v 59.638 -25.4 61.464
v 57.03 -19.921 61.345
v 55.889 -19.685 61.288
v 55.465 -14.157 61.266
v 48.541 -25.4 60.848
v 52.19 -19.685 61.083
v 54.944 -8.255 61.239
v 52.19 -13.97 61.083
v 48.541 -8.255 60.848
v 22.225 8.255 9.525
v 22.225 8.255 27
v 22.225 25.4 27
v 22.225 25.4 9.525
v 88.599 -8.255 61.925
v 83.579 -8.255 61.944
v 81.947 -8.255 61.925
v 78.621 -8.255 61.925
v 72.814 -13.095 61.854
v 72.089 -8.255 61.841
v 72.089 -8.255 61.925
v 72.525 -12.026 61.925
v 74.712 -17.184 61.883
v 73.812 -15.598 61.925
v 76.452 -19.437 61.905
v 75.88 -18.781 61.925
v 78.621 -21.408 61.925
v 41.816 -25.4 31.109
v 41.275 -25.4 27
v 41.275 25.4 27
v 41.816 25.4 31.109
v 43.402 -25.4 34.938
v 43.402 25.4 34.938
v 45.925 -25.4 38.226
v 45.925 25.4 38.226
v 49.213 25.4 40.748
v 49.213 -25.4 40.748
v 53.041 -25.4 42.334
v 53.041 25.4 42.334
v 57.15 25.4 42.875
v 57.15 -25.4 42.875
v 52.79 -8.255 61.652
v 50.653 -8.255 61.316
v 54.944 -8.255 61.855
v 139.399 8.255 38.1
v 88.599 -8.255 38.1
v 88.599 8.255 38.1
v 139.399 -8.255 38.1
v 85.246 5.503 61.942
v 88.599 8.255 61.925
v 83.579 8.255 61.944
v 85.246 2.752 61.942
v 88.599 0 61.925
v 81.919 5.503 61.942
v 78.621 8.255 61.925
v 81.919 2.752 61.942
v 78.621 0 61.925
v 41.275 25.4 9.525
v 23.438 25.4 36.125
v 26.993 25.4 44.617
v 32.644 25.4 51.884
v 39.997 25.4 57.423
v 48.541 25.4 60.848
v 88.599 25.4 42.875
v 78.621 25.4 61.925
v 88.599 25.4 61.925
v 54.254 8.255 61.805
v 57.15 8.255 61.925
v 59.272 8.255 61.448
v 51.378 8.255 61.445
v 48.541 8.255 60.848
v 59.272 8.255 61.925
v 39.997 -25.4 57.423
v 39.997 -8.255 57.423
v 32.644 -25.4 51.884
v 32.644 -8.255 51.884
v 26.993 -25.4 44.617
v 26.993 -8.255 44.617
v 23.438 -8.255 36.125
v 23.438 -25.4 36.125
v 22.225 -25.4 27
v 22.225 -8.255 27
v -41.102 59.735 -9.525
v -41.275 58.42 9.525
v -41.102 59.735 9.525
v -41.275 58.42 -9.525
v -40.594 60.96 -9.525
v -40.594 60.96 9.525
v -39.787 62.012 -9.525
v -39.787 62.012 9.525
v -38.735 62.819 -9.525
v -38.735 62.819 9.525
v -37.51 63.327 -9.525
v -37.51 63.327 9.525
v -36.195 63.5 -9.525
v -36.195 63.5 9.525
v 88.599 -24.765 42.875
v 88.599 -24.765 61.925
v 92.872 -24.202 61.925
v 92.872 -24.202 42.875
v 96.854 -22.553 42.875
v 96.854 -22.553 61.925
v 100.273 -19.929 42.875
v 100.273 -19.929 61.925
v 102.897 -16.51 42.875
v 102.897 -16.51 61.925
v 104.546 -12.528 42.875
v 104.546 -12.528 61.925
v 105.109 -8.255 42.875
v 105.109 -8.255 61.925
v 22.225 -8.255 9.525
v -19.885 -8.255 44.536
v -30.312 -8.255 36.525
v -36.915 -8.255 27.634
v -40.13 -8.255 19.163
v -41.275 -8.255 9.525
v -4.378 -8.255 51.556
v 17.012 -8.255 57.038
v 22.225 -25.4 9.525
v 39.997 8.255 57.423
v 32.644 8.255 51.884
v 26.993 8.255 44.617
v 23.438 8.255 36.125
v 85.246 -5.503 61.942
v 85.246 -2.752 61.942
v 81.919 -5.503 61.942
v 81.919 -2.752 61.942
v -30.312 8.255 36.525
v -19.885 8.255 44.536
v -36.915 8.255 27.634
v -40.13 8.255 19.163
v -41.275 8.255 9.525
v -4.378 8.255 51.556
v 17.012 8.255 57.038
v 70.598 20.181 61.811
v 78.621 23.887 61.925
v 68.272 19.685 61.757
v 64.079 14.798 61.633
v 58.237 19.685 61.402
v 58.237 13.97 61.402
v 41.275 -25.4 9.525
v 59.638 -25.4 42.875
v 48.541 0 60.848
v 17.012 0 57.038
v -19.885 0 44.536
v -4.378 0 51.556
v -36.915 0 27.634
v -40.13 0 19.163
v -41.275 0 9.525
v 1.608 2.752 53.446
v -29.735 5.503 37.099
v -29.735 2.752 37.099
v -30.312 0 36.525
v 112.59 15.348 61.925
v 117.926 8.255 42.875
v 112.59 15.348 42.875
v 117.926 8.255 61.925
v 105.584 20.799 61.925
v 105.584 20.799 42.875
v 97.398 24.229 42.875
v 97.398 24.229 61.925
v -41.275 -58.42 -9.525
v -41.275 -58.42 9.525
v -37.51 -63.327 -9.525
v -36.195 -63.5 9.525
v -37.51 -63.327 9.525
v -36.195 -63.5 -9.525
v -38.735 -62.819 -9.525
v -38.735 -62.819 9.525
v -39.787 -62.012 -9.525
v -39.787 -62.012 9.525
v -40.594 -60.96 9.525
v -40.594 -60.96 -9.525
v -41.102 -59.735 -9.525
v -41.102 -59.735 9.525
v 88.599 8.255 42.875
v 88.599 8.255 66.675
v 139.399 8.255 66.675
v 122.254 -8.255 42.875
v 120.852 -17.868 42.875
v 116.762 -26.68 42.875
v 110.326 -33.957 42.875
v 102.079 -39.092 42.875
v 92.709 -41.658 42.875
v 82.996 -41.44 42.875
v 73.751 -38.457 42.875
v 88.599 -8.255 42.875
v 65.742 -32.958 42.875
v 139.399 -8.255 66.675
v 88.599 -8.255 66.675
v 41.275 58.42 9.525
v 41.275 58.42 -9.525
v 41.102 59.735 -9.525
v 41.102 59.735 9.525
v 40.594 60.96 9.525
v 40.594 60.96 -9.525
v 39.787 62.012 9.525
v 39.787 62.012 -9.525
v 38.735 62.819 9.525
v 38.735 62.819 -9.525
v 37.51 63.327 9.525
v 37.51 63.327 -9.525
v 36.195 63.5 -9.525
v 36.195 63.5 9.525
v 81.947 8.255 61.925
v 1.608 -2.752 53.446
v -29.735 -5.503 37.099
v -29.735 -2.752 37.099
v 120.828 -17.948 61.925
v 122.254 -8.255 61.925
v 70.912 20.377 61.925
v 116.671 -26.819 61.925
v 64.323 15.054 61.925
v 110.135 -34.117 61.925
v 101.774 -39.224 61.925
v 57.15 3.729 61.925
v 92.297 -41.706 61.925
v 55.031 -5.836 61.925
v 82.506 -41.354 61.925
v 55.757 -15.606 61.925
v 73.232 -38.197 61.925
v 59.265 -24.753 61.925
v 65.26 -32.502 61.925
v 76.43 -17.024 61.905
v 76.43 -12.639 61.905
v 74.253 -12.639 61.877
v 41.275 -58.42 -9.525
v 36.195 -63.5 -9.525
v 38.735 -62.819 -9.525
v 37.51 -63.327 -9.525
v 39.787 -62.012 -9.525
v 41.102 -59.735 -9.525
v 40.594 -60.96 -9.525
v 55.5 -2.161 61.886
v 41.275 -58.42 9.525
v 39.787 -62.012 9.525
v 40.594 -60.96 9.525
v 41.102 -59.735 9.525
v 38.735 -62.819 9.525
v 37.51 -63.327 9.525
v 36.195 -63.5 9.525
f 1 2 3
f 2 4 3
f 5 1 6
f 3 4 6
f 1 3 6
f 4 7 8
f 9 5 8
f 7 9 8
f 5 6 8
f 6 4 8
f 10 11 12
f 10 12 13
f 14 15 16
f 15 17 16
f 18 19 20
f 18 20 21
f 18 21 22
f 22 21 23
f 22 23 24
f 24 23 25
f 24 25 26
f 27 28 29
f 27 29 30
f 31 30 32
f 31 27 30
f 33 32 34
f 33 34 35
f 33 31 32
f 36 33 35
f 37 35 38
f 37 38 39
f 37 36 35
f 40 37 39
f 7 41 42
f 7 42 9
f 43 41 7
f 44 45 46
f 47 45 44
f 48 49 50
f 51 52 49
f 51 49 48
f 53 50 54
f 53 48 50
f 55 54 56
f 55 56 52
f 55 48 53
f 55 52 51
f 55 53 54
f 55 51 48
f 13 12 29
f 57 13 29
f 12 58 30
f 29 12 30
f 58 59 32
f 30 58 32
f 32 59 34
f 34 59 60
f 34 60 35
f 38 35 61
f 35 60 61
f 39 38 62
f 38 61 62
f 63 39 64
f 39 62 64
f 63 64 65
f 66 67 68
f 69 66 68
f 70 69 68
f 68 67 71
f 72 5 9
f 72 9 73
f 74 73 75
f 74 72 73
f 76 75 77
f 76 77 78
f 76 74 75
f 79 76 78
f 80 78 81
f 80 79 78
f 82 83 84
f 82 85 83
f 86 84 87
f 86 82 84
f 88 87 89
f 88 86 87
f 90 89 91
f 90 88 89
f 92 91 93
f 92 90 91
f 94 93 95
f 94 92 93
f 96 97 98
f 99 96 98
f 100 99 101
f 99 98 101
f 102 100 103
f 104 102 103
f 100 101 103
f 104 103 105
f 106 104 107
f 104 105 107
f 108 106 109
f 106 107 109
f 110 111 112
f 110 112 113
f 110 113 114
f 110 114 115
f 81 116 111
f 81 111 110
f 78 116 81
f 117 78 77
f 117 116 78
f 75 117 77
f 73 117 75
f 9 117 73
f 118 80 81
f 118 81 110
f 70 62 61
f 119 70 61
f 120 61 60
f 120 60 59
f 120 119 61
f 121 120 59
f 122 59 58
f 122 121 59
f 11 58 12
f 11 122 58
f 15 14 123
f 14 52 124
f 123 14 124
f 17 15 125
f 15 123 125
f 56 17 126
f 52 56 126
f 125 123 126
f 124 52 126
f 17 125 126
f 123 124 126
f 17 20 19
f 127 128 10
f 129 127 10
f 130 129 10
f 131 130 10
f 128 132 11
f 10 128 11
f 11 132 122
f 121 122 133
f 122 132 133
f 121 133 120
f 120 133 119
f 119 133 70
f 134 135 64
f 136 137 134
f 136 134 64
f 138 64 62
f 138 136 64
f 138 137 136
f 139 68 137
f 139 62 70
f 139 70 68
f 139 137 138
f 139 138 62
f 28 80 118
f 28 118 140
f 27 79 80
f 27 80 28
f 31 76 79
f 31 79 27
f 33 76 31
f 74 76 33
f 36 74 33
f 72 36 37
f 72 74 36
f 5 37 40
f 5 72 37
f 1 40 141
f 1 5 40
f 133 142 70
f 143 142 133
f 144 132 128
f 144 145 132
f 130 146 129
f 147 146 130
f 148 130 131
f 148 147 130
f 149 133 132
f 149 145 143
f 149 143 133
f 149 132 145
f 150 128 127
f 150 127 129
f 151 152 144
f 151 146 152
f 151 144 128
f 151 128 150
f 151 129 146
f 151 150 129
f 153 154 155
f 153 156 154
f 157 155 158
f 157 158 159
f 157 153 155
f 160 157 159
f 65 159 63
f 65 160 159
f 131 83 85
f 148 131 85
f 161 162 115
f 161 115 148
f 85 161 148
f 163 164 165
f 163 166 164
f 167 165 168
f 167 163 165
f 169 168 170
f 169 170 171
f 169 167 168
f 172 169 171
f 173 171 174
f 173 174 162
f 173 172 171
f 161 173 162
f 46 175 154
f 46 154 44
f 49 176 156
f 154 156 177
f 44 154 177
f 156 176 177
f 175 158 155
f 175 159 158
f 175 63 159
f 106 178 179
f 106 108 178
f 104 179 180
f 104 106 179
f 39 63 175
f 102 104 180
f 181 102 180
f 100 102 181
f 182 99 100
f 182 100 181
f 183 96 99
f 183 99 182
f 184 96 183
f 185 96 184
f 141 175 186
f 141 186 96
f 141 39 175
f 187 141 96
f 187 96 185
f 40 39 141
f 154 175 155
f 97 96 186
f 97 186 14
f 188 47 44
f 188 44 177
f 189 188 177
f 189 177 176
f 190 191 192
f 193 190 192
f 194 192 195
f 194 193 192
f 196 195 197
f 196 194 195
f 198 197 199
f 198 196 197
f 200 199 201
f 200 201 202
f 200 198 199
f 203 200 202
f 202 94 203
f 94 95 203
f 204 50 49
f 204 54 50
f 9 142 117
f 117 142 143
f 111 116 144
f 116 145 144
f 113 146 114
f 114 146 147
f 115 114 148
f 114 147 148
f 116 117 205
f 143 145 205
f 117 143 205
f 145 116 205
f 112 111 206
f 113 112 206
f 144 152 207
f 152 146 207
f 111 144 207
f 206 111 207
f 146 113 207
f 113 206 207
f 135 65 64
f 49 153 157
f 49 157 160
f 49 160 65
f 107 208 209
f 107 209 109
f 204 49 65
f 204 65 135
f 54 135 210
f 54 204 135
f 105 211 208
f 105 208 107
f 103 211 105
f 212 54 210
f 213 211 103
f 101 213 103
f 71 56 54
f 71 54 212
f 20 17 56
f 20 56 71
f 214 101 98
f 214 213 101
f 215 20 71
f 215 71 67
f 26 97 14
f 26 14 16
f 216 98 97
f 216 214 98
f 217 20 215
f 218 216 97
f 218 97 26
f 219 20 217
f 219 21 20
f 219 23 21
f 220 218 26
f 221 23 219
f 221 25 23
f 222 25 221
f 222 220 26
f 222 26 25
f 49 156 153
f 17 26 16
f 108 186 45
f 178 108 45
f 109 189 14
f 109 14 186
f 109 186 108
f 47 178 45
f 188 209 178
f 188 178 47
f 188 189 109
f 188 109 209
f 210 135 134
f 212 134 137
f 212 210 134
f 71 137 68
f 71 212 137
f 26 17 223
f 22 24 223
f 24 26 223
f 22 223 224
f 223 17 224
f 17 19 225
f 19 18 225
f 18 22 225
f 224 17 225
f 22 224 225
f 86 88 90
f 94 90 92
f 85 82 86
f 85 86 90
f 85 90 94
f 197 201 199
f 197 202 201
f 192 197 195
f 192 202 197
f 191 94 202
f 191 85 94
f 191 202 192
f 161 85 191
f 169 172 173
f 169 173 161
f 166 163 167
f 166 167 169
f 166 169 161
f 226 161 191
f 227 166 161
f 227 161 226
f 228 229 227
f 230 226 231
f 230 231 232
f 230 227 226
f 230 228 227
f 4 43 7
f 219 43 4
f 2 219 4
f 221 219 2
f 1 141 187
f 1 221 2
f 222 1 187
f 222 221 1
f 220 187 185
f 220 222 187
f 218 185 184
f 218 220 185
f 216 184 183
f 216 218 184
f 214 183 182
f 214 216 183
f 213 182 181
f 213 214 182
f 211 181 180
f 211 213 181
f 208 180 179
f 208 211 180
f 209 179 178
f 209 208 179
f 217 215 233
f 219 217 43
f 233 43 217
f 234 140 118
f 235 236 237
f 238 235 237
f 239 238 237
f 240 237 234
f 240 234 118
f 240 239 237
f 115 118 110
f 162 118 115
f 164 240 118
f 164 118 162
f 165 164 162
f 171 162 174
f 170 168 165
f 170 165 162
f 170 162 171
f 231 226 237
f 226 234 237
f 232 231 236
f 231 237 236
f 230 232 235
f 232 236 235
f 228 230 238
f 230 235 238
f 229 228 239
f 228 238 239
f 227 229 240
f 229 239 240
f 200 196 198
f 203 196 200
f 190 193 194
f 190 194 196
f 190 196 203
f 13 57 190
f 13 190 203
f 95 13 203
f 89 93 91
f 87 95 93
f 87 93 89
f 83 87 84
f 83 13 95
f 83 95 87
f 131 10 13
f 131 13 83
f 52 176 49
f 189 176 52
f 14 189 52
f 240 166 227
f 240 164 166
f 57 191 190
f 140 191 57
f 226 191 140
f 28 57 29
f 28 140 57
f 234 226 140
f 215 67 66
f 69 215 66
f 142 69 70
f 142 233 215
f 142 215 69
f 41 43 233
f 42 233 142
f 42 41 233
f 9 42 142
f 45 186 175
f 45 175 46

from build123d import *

# Parameters (mm, degrees)
F1_DEPTH  = 63.5
F2_DEPTH  = 25.4
F3_DEPTH  = 8.255
F3_FACE_W = 17.145
F3_FACE_H = 19.05
F5_R      = 5.08


with BuildPart() as f1:
    # F0 (on Front) → F1 (new body, symmetric)
    with BuildSketch(Plane.XZ):
        Polygon((22.225, 9.525), (-41.275, 9.525), (-41.275, -9.525), (41.275, -9.525), (41.275, 9.525), align=None)
    extrude(amount=F1_DEPTH, both=True)

    # F0 (on Front) → F2 (join, symmetric)
    with BuildSketch(Plane.XZ):
        with BuildLine():
            Line((22.225, 27.0002), (22.225, 9.525))
            Line((22.225, 9.525), (41.275, 9.525))
            Line((41.275, 9.525), (41.275, 27.0002))
            ThreePointArc((41.275, 27.0002), (45.9246798487, 38.2255201513), (57.15, 42.8752))
            Line((57.15, 42.8752), (88.5989319826, 42.8752))
            Line((88.5989319826, 42.8752), (88.5989319826, 61.9252))
            Line((88.5989319826, 61.9252), (78.620570292, 61.9252))
            add(Edge.make_bspline(
                [(78.620570292, 61.9252), (68.1221807027, 61.8456885377), (58.0598709285, 61.5059481055), (48.5414196568, 60.8476219029)],
                knots=[6.3360896089, 6.3360896089, 6.3360896089, 6.3360896089, 26.5881828435, 26.5881828435, 26.5881828435, 26.5881828435], degree=3))
            ThreePointArc((48.5414196568, 60.8476219029), (29.5781820196, 48.4373284984), (22.225, 27.0002))
        make_face()
    extrude(amount=F2_DEPTH, both=True)

    # F0 (on Front) → F3 (join, symmetric)
    with BuildSketch(Plane.XZ):
        with BuildLine():
            add(Edge.make_bspline(
                [(48.5414196568, 60.8476219029), (-4.783802037, 57.1594808708), (-41.0396070564, 43.4722808258), (-41.275, 9.525)],
                knots=[26.5881828435, 26.5881828435, 26.5881828435, 26.5881828435, 140.0464893122, 140.0464893122, 140.0464893122, 140.0464893122], degree=3))
            Line((-41.275, 9.525), (22.225, 9.525))
            Line((22.225, 9.525), (22.225, 27.0002))
            ThreePointArc((22.225, 27.0002), (29.5781820196, 48.4373284984), (48.5414196568, 60.8476219029))
        make_face()
        Polygon((22.225, 9.525), (-41.275, 9.525), (-41.275, -9.525), (41.275, -9.525), (41.275, 9.525), align=None)
        with BuildLine():
            Line((22.225, 27.0002), (22.225, 9.525))
            Line((22.225, 9.525), (41.275, 9.525))
            Line((41.275, 9.525), (41.275, 27.0002))
            ThreePointArc((41.275, 27.0002), (45.9246798487, 38.2255201513), (57.15, 42.8752))
            Line((57.15, 42.8752), (88.5989319826, 42.8752))
            Line((88.5989319826, 42.8752), (88.5989319826, 61.9252))
            Line((88.5989319826, 61.9252), (78.620570292, 61.9252))
            add(Edge.make_bspline(
                [(78.620570292, 61.9252), (68.1221807027, 61.8456885377), (58.0598709285, 61.5059481055), (48.5414196568, 60.8476219029)],
                knots=[6.3360896089, 6.3360896089, 6.3360896089, 6.3360896089, 26.5881828435, 26.5881828435, 26.5881828435, 26.5881828435], degree=3))
            ThreePointArc((48.5414196568, 60.8476219029), (29.5781820196, 48.4373284984), (22.225, 27.0002))
        make_face()
        with BuildLine():
            ThreePointArc((57.15, 61.9252), (52.8121194668, 61.6547583939), (48.5414196568, 60.8476219029))
            add(Edge.make_bspline(
                [(78.620570292, 61.9252), (68.1221807027, 61.8456885377), (58.0598709285, 61.5059481055), (48.5414196568, 60.8476219029)],
                knots=[6.3360896089, 6.3360896089, 6.3360896089, 6.3360896089, 26.5881828435, 26.5881828435, 26.5881828435, 26.5881828435], degree=3))
            Line((78.620570292, 61.9252), (57.15, 61.9252))
        make_face()
        with BuildLine():
            add(Edge.make_bspline(
                [(88.5989319826, 61.9252), (85.23232743, 61.9494803379), (81.9051066812, 61.9500760335), (78.620570292, 61.9252)],
                knots=[0, 0, 0, 0, 6.3360896089, 6.3360896089, 6.3360896089, 6.3360896089], degree=3))
            Line((78.620570292, 61.9252), (88.5989319826, 61.9252))
        make_face()
        Polygon((88.5989319826, 66.675), (88.5989319826, 61.9252), (88.5989319826, 42.8752), (88.5989319826, 38.1), (139.3989319826, 38.1), (139.3989319826, 66.675), align=None)
    extrude(amount=F3_DEPTH, both=True)

    # F3_face (on face) → F4 (revolve)
    with BuildSketch(Plane(origin=(88.5989319826, 16.8275, 52.4002), x_dir=(0, 1, 0), z_dir=(1, 0, 0))):
        Rectangle(F3_FACE_W, F3_FACE_H)
    revolve(axis=Axis((88.5989319826, -8.255, 52.4002), (0, 0, 1)))

    # F5
    f5_edges = [f1.edges().sort_by_distance(p)[0] for p in [
        (-41.275, -63.5, 0),
        (41.275, -63.5, 0),
        (41.275, 63.5, 0),
        (-41.275, 63.5, 0),
    ]]
    fillet(f5_edges, radius=F5_R)


solid = f1.part
